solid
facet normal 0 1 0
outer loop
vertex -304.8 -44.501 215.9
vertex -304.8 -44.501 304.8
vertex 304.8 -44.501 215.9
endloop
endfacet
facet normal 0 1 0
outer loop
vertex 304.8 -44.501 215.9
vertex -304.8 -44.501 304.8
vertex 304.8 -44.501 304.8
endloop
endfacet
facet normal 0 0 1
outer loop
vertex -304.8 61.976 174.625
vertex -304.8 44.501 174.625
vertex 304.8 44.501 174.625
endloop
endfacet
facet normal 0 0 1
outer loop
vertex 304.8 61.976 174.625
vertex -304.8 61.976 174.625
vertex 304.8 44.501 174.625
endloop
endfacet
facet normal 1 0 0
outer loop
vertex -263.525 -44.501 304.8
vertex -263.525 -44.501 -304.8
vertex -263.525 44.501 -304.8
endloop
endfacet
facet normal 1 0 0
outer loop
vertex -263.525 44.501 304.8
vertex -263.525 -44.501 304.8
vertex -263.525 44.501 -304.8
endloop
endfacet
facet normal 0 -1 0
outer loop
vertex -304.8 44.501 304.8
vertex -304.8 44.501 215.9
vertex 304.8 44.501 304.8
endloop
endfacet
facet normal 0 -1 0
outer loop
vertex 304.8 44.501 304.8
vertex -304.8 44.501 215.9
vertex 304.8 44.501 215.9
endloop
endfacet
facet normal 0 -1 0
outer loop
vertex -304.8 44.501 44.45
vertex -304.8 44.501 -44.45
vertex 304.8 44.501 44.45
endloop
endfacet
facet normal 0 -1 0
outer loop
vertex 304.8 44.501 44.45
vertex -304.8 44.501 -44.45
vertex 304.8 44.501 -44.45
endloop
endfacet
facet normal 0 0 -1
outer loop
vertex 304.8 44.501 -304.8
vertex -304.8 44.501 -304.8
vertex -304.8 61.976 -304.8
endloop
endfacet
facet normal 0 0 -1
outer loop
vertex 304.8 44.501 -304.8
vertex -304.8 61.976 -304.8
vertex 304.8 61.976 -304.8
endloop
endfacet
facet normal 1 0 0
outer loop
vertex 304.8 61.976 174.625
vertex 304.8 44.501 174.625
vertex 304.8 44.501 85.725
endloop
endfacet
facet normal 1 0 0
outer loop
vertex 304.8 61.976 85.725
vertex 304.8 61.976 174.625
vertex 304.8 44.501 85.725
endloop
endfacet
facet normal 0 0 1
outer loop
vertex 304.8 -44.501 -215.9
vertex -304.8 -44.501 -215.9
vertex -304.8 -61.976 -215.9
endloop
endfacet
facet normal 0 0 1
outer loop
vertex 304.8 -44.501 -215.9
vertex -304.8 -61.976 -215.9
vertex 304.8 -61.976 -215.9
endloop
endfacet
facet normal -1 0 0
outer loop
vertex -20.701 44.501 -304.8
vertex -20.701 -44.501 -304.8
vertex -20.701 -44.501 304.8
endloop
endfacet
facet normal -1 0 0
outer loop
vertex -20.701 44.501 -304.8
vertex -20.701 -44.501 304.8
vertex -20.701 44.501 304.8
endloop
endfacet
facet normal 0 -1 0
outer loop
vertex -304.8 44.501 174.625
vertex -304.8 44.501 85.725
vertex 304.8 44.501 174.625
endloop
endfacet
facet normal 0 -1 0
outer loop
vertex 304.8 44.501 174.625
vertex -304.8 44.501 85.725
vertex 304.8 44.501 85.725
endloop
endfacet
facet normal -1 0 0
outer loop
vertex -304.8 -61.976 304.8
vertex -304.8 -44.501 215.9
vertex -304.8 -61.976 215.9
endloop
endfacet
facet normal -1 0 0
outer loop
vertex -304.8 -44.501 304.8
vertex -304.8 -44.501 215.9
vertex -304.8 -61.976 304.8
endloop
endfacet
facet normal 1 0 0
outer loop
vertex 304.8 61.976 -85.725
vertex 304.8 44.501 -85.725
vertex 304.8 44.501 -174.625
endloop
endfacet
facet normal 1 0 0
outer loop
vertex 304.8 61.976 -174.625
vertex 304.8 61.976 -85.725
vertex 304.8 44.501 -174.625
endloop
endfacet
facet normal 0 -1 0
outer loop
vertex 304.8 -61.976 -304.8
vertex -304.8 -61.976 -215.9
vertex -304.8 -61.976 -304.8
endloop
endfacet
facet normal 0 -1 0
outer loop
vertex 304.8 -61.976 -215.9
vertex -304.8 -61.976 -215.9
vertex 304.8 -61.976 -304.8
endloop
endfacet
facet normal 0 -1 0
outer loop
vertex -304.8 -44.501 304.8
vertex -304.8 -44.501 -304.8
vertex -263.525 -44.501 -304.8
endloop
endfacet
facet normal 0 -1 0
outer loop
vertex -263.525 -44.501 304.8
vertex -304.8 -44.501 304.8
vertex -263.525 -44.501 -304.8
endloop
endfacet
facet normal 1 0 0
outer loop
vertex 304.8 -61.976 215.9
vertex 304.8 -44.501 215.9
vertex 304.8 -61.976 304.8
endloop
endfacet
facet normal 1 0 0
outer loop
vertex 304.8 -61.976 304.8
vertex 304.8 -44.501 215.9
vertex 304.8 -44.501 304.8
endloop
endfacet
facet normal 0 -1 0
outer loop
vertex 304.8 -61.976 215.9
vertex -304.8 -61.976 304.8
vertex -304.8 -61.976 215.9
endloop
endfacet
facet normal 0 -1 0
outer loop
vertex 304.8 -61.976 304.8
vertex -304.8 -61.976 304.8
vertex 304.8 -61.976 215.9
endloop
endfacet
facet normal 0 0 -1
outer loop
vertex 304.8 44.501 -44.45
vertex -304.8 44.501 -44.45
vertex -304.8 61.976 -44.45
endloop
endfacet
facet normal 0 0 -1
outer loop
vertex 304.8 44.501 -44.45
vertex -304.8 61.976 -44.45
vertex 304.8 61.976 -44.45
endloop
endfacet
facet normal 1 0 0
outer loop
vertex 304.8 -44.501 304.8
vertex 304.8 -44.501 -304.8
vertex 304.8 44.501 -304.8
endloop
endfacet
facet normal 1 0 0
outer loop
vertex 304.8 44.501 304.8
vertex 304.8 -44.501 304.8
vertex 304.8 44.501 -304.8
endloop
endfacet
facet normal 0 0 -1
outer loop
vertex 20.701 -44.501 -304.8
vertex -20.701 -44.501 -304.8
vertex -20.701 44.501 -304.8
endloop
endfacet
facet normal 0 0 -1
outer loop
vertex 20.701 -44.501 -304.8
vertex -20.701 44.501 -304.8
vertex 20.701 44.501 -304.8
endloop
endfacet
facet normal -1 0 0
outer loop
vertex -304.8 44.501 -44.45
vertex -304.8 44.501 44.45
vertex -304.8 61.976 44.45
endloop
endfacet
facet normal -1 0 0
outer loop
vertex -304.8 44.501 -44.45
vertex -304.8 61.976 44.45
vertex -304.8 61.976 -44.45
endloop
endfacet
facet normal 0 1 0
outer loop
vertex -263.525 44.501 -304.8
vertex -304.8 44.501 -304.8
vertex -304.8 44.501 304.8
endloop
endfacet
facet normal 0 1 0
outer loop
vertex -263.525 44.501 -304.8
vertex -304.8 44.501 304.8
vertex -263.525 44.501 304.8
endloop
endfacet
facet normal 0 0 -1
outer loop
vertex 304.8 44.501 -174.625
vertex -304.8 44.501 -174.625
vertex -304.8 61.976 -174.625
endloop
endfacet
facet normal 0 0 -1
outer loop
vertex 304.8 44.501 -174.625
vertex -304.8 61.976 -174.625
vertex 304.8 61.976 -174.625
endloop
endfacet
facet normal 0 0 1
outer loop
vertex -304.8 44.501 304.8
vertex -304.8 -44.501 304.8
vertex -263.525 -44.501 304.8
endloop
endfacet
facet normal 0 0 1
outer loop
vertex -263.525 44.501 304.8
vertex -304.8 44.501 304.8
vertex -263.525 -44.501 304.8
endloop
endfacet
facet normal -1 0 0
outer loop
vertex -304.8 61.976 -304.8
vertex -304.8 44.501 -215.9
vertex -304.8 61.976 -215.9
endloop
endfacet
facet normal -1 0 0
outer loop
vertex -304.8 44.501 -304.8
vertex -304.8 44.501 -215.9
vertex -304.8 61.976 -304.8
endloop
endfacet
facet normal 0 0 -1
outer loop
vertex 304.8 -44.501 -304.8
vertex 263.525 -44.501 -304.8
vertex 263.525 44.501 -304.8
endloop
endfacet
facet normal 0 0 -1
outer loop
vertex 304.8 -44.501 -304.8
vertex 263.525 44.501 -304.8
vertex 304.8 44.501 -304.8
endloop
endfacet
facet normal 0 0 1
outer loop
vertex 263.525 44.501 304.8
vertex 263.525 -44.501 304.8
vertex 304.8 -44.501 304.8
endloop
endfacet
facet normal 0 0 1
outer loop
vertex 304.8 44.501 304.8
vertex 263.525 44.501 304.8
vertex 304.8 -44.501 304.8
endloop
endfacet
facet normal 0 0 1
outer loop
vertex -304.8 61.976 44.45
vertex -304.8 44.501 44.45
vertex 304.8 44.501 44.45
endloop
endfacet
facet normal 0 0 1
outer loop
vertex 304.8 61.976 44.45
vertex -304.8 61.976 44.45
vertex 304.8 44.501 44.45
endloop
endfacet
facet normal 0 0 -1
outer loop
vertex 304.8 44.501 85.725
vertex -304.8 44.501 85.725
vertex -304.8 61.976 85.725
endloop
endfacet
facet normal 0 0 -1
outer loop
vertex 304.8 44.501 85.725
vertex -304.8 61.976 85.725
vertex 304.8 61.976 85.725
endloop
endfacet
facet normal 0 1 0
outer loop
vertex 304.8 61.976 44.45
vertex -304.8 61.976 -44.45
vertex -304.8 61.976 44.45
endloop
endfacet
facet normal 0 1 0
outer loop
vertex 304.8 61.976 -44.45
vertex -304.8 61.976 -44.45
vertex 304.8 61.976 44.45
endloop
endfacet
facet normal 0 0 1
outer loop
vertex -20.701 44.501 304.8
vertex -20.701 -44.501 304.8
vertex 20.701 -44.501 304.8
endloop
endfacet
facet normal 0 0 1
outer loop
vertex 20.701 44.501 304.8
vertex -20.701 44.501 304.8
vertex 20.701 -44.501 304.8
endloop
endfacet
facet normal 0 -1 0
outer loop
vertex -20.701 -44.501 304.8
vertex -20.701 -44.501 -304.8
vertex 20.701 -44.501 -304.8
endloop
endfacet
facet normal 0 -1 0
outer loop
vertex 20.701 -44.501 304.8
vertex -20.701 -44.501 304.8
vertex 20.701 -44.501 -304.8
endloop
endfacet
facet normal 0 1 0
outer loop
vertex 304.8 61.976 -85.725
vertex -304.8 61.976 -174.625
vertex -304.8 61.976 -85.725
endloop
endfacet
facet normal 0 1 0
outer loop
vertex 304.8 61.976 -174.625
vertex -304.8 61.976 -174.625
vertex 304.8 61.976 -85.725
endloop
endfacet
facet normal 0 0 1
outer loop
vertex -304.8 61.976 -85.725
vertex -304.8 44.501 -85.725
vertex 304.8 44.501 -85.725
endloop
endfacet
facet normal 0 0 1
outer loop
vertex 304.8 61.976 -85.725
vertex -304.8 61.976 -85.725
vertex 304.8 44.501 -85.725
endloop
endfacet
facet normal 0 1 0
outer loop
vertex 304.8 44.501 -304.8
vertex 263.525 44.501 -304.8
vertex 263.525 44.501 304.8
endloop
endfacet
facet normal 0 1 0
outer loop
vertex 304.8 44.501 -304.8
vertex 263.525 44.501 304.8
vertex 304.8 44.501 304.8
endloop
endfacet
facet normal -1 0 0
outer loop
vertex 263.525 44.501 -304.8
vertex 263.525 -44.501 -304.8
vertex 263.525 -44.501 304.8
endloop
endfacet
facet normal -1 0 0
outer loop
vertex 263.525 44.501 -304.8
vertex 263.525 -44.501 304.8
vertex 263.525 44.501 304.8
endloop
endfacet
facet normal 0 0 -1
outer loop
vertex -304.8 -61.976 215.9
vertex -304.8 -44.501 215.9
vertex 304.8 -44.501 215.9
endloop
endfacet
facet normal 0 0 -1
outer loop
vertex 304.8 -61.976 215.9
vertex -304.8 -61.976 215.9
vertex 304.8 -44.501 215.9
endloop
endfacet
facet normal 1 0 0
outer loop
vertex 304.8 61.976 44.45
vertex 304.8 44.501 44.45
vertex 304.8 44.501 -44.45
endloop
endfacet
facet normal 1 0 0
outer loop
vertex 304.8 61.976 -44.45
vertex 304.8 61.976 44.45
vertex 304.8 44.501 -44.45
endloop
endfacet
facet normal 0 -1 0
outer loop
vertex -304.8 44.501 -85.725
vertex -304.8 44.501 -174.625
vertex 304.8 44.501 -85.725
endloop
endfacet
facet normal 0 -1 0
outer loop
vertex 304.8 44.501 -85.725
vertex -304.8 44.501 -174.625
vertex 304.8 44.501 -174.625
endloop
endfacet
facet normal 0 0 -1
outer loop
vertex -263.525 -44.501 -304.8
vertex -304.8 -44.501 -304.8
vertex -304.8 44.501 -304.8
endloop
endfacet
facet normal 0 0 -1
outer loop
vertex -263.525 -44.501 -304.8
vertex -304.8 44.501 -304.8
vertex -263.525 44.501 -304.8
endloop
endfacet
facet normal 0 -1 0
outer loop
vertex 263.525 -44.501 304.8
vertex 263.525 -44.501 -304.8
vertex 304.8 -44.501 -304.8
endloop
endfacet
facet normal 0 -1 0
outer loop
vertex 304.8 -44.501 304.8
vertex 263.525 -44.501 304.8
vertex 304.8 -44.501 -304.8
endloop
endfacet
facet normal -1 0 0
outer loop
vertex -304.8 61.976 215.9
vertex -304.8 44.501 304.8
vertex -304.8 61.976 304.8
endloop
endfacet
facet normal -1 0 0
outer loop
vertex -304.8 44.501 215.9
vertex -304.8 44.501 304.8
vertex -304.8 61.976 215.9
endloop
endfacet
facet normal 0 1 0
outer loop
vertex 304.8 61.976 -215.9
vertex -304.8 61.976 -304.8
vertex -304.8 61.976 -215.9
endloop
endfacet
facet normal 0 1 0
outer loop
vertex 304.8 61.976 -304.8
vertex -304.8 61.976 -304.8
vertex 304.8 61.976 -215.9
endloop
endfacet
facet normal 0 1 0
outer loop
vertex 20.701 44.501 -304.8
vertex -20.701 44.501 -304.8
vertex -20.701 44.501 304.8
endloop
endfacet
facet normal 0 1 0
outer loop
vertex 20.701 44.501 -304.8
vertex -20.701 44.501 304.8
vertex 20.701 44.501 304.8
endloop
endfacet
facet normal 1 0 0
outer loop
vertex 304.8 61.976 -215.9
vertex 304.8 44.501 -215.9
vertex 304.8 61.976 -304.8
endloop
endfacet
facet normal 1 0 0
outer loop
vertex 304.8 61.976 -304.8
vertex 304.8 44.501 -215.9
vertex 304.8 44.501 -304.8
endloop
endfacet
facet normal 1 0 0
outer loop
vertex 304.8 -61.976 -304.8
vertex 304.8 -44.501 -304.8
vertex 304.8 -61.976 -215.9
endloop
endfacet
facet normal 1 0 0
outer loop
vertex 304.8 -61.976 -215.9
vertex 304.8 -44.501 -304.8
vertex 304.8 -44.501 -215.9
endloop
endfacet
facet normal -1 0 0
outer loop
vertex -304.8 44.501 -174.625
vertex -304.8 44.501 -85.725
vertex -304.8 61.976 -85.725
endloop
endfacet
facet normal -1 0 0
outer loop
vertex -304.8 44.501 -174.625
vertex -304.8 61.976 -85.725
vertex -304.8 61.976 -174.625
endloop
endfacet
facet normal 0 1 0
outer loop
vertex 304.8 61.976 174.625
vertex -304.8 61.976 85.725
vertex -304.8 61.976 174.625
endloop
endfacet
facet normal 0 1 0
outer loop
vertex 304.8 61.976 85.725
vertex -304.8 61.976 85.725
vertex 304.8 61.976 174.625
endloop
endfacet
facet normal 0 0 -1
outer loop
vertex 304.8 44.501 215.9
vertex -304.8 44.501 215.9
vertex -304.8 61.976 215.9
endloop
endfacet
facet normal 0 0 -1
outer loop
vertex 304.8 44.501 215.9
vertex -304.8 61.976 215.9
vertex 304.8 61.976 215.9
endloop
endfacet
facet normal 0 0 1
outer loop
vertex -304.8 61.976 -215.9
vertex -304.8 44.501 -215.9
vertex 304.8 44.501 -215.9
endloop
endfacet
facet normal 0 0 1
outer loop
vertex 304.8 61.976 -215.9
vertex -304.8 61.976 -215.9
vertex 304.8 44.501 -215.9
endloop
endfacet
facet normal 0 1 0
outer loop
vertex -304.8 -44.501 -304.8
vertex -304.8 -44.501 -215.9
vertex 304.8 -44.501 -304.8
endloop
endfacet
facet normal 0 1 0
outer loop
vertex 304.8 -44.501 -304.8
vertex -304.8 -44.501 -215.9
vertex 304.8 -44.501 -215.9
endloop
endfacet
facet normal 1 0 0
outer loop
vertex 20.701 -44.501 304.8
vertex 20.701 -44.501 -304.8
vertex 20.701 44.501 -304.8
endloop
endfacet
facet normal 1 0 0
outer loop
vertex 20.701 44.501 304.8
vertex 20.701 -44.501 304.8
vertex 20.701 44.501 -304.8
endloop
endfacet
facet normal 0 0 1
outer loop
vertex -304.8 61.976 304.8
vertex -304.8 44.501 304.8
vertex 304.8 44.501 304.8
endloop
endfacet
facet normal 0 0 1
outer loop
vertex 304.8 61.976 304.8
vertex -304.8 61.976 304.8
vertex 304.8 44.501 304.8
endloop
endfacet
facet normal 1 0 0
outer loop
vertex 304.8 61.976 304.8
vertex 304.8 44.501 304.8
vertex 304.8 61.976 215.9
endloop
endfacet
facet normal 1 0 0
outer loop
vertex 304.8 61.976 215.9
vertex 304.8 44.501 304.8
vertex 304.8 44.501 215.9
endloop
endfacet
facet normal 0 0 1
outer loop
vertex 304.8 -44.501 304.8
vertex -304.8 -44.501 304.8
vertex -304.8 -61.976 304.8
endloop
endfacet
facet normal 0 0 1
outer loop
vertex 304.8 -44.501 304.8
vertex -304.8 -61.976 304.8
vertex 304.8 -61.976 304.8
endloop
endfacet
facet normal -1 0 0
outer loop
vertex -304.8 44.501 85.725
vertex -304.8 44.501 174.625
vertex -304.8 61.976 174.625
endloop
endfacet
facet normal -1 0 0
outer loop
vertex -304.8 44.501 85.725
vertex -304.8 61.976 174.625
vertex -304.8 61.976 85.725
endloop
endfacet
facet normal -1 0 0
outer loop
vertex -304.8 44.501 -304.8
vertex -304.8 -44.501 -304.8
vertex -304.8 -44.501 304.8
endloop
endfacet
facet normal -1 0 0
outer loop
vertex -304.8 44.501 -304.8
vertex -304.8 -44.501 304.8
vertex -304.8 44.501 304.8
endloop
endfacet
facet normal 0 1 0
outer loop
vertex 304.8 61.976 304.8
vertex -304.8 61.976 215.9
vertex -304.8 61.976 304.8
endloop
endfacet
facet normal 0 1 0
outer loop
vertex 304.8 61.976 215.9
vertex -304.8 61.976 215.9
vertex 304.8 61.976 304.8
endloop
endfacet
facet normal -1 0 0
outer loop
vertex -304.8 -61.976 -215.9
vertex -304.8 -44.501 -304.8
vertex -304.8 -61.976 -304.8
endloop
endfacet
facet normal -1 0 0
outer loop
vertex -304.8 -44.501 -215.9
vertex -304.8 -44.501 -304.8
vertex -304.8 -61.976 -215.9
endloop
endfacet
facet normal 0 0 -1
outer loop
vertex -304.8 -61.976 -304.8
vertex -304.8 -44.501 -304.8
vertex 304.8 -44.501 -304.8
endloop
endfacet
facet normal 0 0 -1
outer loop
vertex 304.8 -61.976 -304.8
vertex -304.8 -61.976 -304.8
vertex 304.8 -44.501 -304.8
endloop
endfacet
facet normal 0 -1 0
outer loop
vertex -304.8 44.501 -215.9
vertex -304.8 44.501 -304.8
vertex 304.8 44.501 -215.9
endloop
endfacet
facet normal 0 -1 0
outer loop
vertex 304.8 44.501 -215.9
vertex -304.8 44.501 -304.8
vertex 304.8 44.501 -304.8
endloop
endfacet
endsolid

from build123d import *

# Parameters (mm, degrees)
BOSS_EXTRUDE1_DEPTH        = 304.8
BOSS_EXTRUDE1_DEPTH_BACK   = 304.8
SKETCH3_W                  = 41.275
SKETCH3_H                  = 89.0016
BOSS_EXTRUDE1_2_DEPTH      = 304.8
BOSS_EXTRUDE1_2_DEPTH_BACK = 304.8
SKETCH3_W_2                = 41.402
BOSS_EXTRUDE1_3_DEPTH      = 304.8
BOSS_EXTRUDE1_3_DEPTH_BACK = 304.8
SKETCH4_W                  = 609.6
SKETCH4_H                  = 88.9
BOSS_EXTRUDE2_DEPTH        = 17.4752
BOSS_EXTRUDE2_2_DEPTH      = 17.4752
BOSS_EXTRUDE2_3_DEPTH      = 17.4752
BOSS_EXTRUDE2_4_DEPTH      = 17.4752
BOSS_EXTRUDE2_5_DEPTH      = 17.4752
SKETCH5_W                  = 609.6
SKETCH5_H                  = 88.9
BOSS_EXTRUDE3_DEPTH        = 17.4752
BOSS_EXTRUDE3_2_DEPTH      = 17.4752


with BuildPart() as part:
    # Sketch3 → Boss-Extrude1 (new, two sides: drawn at the far end of the back side and taken through both)
    with BuildSketch(Plane.XY.offset(-BOSS_EXTRUDE1_DEPTH_BACK)):
        with Locations((-284.1625, 0)):
            Rectangle(SKETCH3_W, SKETCH3_H)
    extrude(amount=BOSS_EXTRUDE1_DEPTH + BOSS_EXTRUDE1_DEPTH_BACK)


with BuildPart() as body_2:
    # Sketch3 → Boss-Extrude1 2 (new, two sides: drawn at the far end of the back side and taken through both)
    with BuildSketch(Plane.XY.offset(-BOSS_EXTRUDE1_2_DEPTH_BACK)):
        Rectangle(SKETCH3_W_2, SKETCH3_H)
    extrude(amount=BOSS_EXTRUDE1_2_DEPTH + BOSS_EXTRUDE1_2_DEPTH_BACK)


with BuildPart() as body_3:
    # Sketch3 → Boss-Extrude1 3 (new, two sides: drawn at the far end of the back side and taken through both)
    with BuildSketch(Plane.XY.offset(-BOSS_EXTRUDE1_3_DEPTH_BACK)):
        with Locations((284.1625, 0)):
            Rectangle(SKETCH3_W, SKETCH3_H)
    extrude(amount=BOSS_EXTRUDE1_3_DEPTH + BOSS_EXTRUDE1_3_DEPTH_BACK)


with BuildPart() as body_4:
    # Sketch4 → Boss-Extrude2 (new body)
    with BuildSketch(Plane(origin=(0, 44.5008, 0), x_dir=(1, 0, 0), z_dir=(0, 1, 0))):
        with Locations((0, -260.35)):
            Rectangle(SKETCH4_W, SKETCH4_H)
    extrude(amount=BOSS_EXTRUDE2_DEPTH)


with BuildPart() as body_5:
    # Sketch4 → Boss-Extrude2 2 (new body)
    with BuildSketch(Plane(origin=(0, 44.5008, 0), x_dir=(1, 0, 0), z_dir=(0, 1, 0))):
        with Locations((0, -130.175)):
            Rectangle(SKETCH4_W, SKETCH4_H)
    extrude(amount=BOSS_EXTRUDE2_2_DEPTH)


with BuildPart() as body_6:
    # Sketch4 → Boss-Extrude2 3 (new body)
    with BuildSketch(Plane(origin=(0, 44.5008, 0), x_dir=(1, 0, 0), z_dir=(0, 1, 0))):
        Rectangle(SKETCH4_W, SKETCH4_H)
    extrude(amount=BOSS_EXTRUDE2_3_DEPTH)


with BuildPart() as body_7:
    # Sketch4 → Boss-Extrude2 4 (new body)
    with BuildSketch(Plane(origin=(0, 44.5008, 0), x_dir=(1, 0, 0), z_dir=(0, 1, 0))):
        with Locations((0, 130.175)):
            Rectangle(SKETCH4_W, SKETCH4_H)
    extrude(amount=BOSS_EXTRUDE2_4_DEPTH)


with BuildPart() as body_8:
    # Sketch4 → Boss-Extrude2 5 (new body)
    with BuildSketch(Plane(origin=(0, 44.5008, 0), x_dir=(1, 0, 0), z_dir=(0, 1, 0))):
        with Locations((0, 260.35)):
            Rectangle(SKETCH4_W, SKETCH4_H)
    extrude(amount=BOSS_EXTRUDE2_5_DEPTH)


with BuildPart() as body_9:
    # Sketch5 → Boss-Extrude3 (new body)
    with BuildSketch(Plane.XZ.offset(44.5008)):
        with Locations((0, 260.35)):
            Rectangle(SKETCH5_W, SKETCH5_H)
    extrude(amount=BOSS_EXTRUDE3_DEPTH)


with BuildPart() as body_10:
    # Sketch5 → Boss-Extrude3 2 (new body)
    with BuildSketch(Plane.XZ.offset(44.5008)):
        with Locations((0, -260.35)):
            Rectangle(SKETCH5_W, SKETCH5_H)
    extrude(amount=BOSS_EXTRUDE3_2_DEPTH)


solid = Compound([part.part, body_2.part, body_3.part, body_4.part, body_5.part, body_6.part, body_7.part, body_8.part, body_9.part, body_10.part])
